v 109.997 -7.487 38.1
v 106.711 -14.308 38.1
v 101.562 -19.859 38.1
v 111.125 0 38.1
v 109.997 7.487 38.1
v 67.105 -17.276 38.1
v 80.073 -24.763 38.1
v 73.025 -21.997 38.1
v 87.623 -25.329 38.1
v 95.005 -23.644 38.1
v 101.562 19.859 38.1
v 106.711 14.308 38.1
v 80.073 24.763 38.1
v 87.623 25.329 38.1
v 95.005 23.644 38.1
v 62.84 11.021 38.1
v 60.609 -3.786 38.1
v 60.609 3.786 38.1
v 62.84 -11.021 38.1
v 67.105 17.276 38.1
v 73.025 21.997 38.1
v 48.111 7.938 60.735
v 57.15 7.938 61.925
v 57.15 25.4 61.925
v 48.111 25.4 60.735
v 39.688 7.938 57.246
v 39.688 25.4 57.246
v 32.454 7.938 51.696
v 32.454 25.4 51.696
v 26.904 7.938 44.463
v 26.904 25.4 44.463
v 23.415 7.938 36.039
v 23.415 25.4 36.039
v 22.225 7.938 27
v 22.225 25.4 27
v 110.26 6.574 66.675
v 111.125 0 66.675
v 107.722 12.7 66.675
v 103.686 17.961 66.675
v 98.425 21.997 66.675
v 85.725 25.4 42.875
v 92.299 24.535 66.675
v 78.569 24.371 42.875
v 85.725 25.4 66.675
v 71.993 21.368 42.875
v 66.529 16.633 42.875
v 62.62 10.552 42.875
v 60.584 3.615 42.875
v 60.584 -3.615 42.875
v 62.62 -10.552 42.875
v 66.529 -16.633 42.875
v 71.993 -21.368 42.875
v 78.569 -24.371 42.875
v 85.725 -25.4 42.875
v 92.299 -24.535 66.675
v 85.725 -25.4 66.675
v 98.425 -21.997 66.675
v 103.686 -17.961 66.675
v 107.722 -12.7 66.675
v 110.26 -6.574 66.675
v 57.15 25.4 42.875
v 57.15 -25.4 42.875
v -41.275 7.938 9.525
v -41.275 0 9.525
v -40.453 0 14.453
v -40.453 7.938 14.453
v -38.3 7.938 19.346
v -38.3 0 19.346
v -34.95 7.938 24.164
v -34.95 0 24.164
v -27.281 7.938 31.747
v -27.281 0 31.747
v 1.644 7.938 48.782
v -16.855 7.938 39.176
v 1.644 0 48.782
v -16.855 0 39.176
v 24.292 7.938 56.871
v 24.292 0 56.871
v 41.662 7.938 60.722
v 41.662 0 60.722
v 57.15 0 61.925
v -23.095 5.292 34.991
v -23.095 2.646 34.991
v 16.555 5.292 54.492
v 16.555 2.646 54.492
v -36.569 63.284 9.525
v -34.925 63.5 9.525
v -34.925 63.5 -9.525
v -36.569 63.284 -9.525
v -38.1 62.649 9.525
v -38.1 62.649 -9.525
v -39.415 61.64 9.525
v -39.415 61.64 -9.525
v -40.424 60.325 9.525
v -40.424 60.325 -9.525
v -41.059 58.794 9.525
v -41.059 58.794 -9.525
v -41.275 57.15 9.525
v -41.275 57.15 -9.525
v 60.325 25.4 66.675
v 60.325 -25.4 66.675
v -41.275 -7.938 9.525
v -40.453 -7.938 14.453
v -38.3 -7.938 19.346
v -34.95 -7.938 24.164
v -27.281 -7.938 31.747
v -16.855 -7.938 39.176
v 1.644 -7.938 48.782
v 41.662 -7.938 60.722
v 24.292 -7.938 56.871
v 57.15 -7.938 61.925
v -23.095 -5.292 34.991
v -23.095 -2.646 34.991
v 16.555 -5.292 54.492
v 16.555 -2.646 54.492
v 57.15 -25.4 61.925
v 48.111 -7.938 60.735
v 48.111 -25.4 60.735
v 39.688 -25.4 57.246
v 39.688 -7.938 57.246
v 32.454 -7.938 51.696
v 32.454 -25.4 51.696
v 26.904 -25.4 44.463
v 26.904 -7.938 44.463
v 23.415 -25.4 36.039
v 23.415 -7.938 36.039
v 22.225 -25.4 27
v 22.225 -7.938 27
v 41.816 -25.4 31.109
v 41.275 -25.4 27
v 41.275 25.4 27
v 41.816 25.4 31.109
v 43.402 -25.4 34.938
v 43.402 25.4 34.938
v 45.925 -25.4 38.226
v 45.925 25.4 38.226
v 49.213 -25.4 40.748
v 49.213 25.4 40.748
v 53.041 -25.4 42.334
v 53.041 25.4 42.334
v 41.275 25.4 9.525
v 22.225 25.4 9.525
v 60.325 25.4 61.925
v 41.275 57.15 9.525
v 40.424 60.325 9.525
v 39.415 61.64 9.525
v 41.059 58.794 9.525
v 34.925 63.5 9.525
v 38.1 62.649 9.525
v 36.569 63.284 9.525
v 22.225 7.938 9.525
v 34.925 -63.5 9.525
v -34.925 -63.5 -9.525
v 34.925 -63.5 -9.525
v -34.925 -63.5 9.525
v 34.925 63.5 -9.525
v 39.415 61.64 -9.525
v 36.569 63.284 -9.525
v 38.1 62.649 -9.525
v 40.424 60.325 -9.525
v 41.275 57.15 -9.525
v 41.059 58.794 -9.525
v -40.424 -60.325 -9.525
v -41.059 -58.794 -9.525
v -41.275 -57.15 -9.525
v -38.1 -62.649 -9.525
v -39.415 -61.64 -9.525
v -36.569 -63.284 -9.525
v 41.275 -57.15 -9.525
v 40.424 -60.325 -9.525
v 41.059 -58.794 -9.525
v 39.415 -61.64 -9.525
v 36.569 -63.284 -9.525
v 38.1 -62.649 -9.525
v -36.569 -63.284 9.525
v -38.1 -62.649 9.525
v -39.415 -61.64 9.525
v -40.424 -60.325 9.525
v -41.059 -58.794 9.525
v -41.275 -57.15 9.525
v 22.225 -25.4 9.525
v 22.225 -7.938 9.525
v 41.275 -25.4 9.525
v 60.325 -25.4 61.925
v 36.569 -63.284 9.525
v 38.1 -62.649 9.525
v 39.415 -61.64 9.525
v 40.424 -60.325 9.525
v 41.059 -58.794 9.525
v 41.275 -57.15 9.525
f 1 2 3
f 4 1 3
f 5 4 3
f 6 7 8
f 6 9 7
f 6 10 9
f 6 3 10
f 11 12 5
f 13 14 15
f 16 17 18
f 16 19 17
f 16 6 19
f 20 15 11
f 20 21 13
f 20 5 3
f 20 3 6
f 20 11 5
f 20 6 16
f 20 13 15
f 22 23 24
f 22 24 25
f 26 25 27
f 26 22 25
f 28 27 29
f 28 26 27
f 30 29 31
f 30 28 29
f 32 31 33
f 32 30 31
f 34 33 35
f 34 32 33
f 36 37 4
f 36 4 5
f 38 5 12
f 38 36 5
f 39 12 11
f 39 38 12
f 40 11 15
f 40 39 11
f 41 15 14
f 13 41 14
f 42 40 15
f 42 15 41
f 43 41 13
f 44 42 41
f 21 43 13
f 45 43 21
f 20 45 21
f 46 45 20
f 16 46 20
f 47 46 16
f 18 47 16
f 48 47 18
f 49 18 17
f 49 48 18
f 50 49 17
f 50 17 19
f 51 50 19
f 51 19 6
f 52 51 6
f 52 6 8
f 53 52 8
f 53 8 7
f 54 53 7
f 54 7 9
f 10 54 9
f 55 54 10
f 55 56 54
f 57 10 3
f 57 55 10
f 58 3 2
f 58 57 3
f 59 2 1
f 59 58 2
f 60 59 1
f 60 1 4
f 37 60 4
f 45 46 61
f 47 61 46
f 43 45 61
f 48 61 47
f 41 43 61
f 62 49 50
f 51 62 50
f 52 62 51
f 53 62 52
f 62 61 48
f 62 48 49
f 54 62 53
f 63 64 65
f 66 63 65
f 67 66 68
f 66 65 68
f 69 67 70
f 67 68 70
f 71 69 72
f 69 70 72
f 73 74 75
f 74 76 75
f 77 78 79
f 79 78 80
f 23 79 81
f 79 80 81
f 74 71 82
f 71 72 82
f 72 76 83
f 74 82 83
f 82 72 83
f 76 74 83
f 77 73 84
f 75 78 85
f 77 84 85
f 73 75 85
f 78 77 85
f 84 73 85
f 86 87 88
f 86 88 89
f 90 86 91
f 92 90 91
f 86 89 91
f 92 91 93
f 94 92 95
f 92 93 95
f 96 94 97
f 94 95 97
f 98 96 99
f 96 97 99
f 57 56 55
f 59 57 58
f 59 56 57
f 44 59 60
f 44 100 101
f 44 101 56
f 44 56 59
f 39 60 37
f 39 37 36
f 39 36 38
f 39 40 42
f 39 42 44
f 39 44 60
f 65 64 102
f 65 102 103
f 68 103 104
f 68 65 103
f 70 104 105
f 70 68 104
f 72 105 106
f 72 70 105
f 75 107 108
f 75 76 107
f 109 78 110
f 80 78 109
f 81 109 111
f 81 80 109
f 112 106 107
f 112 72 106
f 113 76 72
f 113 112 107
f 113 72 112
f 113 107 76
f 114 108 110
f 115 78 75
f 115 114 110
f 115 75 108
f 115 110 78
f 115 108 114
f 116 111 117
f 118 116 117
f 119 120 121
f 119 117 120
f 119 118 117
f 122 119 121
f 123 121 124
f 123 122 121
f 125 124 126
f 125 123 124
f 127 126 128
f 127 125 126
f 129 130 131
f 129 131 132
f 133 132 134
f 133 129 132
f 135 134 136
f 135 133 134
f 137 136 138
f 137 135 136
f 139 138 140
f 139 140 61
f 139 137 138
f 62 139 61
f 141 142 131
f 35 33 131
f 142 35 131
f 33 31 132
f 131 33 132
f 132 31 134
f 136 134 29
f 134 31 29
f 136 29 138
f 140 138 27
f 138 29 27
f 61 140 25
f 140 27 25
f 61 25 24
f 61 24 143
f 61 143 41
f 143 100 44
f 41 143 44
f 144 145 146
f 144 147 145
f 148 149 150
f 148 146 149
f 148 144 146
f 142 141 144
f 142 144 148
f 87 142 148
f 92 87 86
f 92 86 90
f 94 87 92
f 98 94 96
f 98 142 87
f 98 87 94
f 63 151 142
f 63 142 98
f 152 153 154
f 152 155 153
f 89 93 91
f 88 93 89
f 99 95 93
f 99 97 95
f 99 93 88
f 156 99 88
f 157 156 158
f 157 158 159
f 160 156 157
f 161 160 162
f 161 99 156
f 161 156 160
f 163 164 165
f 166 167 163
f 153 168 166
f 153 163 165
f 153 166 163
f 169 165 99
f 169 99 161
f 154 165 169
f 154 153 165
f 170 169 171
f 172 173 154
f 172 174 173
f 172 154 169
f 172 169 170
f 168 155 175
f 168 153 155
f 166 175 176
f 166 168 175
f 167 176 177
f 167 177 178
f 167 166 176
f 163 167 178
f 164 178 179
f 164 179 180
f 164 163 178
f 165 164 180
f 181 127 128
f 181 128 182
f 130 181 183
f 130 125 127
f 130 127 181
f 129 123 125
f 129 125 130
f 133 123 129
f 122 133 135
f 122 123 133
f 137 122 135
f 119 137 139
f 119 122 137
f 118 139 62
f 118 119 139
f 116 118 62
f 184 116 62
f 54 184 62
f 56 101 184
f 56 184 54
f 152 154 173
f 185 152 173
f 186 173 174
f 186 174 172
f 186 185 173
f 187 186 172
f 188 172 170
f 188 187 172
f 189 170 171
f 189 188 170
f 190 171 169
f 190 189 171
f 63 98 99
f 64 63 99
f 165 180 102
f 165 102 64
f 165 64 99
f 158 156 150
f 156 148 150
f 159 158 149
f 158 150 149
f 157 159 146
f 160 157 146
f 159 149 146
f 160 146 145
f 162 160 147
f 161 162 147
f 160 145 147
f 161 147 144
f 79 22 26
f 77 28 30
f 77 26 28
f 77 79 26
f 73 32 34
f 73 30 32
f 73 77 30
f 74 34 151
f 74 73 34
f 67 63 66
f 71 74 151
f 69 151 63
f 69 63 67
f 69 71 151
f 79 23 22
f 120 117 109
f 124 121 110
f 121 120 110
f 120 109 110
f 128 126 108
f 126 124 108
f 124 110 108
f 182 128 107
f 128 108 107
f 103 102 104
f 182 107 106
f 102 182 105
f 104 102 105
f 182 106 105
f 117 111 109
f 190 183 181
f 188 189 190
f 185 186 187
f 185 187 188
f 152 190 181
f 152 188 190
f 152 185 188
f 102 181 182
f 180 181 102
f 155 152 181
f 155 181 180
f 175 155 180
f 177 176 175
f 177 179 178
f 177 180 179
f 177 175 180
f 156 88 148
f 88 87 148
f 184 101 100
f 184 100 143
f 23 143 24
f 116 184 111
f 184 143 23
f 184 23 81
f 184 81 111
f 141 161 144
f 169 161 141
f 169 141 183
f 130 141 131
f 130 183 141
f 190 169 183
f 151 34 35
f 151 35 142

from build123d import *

# Parameters (mm, degrees)
F1_DEPTH = 63.5
F2_DEPTH = 25.4
F3_DEPTH = 7.9375
F5_R     = 6.35


with BuildPart() as f1:
    # F0 (on Front) → F1 (new body, symmetric)
    with BuildSketch(Plane.XZ):
        Polygon((-41.275, -9.525), (41.275, -9.525), (41.275, 9.525), (22.225, 9.525), (-41.275, 9.525), align=None)
    extrude(amount=F1_DEPTH, both=True)

    # F0 (on Front) → F2 (join, symmetric)
    with BuildSketch(Plane.XZ):
        with BuildLine():
            Line((22.225, 9.525), (41.275, 9.525))
            Line((41.275, 9.525), (41.275, 27.0002))
            ThreePointArc((41.275, 27.0002), (45.92468, 38.22552), (57.15, 42.8752))
            Line((57.15, 42.8752), (60.325, 42.8752))
            Line((60.325, 42.8752), (60.325, 61.9252))
            Line((60.325, 61.9252), (57.15, 61.9252))
            ThreePointArc((57.15, 61.9252), (32.454296, 51.695904), (22.225, 27.0002))
            Line((22.225, 27.0002), (22.225, 9.525))
        make_face()
        Polygon((60.325, 66.675), (60.325, 61.9252), (60.325, 42.8752), (85.725, 42.8752), (85.725, 66.675), align=None)
    extrude(amount=F2_DEPTH, both=True)

    # F0 (on Front) → F3 (join, symmetric)
    with BuildSketch(Plane.XZ):
        with BuildLine():
            add(Edge.make_bspline(
                [(-41.275, 9.525), (-40.671952, 35.93922), (22.924198, 62.560864), (57.15, 61.9252)],
                knots=[0, 0, 0, 0, 111.504536, 111.504536, 111.504536, 111.504536], degree=3))
            Line((-41.275, 9.525), (22.225, 9.525))
            Line((22.225, 9.525), (22.225, 27.0002))
            ThreePointArc((22.225, 27.0002), (32.454296, 51.695904), (57.15, 61.9252))
        make_face()
    extrude(amount=F3_DEPTH, both=True)

    # F0 (on Front) → F4 (revolve)
    with BuildSketch(Plane.XZ):
        Polygon((85.725, 66.675), (85.725, 42.8752), (85.725, 38.1), (111.125, 38.1), (111.125, 66.675), align=None)
    revolve(axis=Axis((85.725, 0, 52.3875), (0, 0, 1)))

    # F5
    f5_edges = [f1.edges().sort_by_distance(p)[0] for p in [
        (-41.275, -63.5, 0),
        (41.275, -63.5, 0),
        (41.275, 63.5, 0),
        (-41.275, 63.5, 0),
    ]]
    fillet(f5_edges, radius=F5_R)


solid = f1.part
